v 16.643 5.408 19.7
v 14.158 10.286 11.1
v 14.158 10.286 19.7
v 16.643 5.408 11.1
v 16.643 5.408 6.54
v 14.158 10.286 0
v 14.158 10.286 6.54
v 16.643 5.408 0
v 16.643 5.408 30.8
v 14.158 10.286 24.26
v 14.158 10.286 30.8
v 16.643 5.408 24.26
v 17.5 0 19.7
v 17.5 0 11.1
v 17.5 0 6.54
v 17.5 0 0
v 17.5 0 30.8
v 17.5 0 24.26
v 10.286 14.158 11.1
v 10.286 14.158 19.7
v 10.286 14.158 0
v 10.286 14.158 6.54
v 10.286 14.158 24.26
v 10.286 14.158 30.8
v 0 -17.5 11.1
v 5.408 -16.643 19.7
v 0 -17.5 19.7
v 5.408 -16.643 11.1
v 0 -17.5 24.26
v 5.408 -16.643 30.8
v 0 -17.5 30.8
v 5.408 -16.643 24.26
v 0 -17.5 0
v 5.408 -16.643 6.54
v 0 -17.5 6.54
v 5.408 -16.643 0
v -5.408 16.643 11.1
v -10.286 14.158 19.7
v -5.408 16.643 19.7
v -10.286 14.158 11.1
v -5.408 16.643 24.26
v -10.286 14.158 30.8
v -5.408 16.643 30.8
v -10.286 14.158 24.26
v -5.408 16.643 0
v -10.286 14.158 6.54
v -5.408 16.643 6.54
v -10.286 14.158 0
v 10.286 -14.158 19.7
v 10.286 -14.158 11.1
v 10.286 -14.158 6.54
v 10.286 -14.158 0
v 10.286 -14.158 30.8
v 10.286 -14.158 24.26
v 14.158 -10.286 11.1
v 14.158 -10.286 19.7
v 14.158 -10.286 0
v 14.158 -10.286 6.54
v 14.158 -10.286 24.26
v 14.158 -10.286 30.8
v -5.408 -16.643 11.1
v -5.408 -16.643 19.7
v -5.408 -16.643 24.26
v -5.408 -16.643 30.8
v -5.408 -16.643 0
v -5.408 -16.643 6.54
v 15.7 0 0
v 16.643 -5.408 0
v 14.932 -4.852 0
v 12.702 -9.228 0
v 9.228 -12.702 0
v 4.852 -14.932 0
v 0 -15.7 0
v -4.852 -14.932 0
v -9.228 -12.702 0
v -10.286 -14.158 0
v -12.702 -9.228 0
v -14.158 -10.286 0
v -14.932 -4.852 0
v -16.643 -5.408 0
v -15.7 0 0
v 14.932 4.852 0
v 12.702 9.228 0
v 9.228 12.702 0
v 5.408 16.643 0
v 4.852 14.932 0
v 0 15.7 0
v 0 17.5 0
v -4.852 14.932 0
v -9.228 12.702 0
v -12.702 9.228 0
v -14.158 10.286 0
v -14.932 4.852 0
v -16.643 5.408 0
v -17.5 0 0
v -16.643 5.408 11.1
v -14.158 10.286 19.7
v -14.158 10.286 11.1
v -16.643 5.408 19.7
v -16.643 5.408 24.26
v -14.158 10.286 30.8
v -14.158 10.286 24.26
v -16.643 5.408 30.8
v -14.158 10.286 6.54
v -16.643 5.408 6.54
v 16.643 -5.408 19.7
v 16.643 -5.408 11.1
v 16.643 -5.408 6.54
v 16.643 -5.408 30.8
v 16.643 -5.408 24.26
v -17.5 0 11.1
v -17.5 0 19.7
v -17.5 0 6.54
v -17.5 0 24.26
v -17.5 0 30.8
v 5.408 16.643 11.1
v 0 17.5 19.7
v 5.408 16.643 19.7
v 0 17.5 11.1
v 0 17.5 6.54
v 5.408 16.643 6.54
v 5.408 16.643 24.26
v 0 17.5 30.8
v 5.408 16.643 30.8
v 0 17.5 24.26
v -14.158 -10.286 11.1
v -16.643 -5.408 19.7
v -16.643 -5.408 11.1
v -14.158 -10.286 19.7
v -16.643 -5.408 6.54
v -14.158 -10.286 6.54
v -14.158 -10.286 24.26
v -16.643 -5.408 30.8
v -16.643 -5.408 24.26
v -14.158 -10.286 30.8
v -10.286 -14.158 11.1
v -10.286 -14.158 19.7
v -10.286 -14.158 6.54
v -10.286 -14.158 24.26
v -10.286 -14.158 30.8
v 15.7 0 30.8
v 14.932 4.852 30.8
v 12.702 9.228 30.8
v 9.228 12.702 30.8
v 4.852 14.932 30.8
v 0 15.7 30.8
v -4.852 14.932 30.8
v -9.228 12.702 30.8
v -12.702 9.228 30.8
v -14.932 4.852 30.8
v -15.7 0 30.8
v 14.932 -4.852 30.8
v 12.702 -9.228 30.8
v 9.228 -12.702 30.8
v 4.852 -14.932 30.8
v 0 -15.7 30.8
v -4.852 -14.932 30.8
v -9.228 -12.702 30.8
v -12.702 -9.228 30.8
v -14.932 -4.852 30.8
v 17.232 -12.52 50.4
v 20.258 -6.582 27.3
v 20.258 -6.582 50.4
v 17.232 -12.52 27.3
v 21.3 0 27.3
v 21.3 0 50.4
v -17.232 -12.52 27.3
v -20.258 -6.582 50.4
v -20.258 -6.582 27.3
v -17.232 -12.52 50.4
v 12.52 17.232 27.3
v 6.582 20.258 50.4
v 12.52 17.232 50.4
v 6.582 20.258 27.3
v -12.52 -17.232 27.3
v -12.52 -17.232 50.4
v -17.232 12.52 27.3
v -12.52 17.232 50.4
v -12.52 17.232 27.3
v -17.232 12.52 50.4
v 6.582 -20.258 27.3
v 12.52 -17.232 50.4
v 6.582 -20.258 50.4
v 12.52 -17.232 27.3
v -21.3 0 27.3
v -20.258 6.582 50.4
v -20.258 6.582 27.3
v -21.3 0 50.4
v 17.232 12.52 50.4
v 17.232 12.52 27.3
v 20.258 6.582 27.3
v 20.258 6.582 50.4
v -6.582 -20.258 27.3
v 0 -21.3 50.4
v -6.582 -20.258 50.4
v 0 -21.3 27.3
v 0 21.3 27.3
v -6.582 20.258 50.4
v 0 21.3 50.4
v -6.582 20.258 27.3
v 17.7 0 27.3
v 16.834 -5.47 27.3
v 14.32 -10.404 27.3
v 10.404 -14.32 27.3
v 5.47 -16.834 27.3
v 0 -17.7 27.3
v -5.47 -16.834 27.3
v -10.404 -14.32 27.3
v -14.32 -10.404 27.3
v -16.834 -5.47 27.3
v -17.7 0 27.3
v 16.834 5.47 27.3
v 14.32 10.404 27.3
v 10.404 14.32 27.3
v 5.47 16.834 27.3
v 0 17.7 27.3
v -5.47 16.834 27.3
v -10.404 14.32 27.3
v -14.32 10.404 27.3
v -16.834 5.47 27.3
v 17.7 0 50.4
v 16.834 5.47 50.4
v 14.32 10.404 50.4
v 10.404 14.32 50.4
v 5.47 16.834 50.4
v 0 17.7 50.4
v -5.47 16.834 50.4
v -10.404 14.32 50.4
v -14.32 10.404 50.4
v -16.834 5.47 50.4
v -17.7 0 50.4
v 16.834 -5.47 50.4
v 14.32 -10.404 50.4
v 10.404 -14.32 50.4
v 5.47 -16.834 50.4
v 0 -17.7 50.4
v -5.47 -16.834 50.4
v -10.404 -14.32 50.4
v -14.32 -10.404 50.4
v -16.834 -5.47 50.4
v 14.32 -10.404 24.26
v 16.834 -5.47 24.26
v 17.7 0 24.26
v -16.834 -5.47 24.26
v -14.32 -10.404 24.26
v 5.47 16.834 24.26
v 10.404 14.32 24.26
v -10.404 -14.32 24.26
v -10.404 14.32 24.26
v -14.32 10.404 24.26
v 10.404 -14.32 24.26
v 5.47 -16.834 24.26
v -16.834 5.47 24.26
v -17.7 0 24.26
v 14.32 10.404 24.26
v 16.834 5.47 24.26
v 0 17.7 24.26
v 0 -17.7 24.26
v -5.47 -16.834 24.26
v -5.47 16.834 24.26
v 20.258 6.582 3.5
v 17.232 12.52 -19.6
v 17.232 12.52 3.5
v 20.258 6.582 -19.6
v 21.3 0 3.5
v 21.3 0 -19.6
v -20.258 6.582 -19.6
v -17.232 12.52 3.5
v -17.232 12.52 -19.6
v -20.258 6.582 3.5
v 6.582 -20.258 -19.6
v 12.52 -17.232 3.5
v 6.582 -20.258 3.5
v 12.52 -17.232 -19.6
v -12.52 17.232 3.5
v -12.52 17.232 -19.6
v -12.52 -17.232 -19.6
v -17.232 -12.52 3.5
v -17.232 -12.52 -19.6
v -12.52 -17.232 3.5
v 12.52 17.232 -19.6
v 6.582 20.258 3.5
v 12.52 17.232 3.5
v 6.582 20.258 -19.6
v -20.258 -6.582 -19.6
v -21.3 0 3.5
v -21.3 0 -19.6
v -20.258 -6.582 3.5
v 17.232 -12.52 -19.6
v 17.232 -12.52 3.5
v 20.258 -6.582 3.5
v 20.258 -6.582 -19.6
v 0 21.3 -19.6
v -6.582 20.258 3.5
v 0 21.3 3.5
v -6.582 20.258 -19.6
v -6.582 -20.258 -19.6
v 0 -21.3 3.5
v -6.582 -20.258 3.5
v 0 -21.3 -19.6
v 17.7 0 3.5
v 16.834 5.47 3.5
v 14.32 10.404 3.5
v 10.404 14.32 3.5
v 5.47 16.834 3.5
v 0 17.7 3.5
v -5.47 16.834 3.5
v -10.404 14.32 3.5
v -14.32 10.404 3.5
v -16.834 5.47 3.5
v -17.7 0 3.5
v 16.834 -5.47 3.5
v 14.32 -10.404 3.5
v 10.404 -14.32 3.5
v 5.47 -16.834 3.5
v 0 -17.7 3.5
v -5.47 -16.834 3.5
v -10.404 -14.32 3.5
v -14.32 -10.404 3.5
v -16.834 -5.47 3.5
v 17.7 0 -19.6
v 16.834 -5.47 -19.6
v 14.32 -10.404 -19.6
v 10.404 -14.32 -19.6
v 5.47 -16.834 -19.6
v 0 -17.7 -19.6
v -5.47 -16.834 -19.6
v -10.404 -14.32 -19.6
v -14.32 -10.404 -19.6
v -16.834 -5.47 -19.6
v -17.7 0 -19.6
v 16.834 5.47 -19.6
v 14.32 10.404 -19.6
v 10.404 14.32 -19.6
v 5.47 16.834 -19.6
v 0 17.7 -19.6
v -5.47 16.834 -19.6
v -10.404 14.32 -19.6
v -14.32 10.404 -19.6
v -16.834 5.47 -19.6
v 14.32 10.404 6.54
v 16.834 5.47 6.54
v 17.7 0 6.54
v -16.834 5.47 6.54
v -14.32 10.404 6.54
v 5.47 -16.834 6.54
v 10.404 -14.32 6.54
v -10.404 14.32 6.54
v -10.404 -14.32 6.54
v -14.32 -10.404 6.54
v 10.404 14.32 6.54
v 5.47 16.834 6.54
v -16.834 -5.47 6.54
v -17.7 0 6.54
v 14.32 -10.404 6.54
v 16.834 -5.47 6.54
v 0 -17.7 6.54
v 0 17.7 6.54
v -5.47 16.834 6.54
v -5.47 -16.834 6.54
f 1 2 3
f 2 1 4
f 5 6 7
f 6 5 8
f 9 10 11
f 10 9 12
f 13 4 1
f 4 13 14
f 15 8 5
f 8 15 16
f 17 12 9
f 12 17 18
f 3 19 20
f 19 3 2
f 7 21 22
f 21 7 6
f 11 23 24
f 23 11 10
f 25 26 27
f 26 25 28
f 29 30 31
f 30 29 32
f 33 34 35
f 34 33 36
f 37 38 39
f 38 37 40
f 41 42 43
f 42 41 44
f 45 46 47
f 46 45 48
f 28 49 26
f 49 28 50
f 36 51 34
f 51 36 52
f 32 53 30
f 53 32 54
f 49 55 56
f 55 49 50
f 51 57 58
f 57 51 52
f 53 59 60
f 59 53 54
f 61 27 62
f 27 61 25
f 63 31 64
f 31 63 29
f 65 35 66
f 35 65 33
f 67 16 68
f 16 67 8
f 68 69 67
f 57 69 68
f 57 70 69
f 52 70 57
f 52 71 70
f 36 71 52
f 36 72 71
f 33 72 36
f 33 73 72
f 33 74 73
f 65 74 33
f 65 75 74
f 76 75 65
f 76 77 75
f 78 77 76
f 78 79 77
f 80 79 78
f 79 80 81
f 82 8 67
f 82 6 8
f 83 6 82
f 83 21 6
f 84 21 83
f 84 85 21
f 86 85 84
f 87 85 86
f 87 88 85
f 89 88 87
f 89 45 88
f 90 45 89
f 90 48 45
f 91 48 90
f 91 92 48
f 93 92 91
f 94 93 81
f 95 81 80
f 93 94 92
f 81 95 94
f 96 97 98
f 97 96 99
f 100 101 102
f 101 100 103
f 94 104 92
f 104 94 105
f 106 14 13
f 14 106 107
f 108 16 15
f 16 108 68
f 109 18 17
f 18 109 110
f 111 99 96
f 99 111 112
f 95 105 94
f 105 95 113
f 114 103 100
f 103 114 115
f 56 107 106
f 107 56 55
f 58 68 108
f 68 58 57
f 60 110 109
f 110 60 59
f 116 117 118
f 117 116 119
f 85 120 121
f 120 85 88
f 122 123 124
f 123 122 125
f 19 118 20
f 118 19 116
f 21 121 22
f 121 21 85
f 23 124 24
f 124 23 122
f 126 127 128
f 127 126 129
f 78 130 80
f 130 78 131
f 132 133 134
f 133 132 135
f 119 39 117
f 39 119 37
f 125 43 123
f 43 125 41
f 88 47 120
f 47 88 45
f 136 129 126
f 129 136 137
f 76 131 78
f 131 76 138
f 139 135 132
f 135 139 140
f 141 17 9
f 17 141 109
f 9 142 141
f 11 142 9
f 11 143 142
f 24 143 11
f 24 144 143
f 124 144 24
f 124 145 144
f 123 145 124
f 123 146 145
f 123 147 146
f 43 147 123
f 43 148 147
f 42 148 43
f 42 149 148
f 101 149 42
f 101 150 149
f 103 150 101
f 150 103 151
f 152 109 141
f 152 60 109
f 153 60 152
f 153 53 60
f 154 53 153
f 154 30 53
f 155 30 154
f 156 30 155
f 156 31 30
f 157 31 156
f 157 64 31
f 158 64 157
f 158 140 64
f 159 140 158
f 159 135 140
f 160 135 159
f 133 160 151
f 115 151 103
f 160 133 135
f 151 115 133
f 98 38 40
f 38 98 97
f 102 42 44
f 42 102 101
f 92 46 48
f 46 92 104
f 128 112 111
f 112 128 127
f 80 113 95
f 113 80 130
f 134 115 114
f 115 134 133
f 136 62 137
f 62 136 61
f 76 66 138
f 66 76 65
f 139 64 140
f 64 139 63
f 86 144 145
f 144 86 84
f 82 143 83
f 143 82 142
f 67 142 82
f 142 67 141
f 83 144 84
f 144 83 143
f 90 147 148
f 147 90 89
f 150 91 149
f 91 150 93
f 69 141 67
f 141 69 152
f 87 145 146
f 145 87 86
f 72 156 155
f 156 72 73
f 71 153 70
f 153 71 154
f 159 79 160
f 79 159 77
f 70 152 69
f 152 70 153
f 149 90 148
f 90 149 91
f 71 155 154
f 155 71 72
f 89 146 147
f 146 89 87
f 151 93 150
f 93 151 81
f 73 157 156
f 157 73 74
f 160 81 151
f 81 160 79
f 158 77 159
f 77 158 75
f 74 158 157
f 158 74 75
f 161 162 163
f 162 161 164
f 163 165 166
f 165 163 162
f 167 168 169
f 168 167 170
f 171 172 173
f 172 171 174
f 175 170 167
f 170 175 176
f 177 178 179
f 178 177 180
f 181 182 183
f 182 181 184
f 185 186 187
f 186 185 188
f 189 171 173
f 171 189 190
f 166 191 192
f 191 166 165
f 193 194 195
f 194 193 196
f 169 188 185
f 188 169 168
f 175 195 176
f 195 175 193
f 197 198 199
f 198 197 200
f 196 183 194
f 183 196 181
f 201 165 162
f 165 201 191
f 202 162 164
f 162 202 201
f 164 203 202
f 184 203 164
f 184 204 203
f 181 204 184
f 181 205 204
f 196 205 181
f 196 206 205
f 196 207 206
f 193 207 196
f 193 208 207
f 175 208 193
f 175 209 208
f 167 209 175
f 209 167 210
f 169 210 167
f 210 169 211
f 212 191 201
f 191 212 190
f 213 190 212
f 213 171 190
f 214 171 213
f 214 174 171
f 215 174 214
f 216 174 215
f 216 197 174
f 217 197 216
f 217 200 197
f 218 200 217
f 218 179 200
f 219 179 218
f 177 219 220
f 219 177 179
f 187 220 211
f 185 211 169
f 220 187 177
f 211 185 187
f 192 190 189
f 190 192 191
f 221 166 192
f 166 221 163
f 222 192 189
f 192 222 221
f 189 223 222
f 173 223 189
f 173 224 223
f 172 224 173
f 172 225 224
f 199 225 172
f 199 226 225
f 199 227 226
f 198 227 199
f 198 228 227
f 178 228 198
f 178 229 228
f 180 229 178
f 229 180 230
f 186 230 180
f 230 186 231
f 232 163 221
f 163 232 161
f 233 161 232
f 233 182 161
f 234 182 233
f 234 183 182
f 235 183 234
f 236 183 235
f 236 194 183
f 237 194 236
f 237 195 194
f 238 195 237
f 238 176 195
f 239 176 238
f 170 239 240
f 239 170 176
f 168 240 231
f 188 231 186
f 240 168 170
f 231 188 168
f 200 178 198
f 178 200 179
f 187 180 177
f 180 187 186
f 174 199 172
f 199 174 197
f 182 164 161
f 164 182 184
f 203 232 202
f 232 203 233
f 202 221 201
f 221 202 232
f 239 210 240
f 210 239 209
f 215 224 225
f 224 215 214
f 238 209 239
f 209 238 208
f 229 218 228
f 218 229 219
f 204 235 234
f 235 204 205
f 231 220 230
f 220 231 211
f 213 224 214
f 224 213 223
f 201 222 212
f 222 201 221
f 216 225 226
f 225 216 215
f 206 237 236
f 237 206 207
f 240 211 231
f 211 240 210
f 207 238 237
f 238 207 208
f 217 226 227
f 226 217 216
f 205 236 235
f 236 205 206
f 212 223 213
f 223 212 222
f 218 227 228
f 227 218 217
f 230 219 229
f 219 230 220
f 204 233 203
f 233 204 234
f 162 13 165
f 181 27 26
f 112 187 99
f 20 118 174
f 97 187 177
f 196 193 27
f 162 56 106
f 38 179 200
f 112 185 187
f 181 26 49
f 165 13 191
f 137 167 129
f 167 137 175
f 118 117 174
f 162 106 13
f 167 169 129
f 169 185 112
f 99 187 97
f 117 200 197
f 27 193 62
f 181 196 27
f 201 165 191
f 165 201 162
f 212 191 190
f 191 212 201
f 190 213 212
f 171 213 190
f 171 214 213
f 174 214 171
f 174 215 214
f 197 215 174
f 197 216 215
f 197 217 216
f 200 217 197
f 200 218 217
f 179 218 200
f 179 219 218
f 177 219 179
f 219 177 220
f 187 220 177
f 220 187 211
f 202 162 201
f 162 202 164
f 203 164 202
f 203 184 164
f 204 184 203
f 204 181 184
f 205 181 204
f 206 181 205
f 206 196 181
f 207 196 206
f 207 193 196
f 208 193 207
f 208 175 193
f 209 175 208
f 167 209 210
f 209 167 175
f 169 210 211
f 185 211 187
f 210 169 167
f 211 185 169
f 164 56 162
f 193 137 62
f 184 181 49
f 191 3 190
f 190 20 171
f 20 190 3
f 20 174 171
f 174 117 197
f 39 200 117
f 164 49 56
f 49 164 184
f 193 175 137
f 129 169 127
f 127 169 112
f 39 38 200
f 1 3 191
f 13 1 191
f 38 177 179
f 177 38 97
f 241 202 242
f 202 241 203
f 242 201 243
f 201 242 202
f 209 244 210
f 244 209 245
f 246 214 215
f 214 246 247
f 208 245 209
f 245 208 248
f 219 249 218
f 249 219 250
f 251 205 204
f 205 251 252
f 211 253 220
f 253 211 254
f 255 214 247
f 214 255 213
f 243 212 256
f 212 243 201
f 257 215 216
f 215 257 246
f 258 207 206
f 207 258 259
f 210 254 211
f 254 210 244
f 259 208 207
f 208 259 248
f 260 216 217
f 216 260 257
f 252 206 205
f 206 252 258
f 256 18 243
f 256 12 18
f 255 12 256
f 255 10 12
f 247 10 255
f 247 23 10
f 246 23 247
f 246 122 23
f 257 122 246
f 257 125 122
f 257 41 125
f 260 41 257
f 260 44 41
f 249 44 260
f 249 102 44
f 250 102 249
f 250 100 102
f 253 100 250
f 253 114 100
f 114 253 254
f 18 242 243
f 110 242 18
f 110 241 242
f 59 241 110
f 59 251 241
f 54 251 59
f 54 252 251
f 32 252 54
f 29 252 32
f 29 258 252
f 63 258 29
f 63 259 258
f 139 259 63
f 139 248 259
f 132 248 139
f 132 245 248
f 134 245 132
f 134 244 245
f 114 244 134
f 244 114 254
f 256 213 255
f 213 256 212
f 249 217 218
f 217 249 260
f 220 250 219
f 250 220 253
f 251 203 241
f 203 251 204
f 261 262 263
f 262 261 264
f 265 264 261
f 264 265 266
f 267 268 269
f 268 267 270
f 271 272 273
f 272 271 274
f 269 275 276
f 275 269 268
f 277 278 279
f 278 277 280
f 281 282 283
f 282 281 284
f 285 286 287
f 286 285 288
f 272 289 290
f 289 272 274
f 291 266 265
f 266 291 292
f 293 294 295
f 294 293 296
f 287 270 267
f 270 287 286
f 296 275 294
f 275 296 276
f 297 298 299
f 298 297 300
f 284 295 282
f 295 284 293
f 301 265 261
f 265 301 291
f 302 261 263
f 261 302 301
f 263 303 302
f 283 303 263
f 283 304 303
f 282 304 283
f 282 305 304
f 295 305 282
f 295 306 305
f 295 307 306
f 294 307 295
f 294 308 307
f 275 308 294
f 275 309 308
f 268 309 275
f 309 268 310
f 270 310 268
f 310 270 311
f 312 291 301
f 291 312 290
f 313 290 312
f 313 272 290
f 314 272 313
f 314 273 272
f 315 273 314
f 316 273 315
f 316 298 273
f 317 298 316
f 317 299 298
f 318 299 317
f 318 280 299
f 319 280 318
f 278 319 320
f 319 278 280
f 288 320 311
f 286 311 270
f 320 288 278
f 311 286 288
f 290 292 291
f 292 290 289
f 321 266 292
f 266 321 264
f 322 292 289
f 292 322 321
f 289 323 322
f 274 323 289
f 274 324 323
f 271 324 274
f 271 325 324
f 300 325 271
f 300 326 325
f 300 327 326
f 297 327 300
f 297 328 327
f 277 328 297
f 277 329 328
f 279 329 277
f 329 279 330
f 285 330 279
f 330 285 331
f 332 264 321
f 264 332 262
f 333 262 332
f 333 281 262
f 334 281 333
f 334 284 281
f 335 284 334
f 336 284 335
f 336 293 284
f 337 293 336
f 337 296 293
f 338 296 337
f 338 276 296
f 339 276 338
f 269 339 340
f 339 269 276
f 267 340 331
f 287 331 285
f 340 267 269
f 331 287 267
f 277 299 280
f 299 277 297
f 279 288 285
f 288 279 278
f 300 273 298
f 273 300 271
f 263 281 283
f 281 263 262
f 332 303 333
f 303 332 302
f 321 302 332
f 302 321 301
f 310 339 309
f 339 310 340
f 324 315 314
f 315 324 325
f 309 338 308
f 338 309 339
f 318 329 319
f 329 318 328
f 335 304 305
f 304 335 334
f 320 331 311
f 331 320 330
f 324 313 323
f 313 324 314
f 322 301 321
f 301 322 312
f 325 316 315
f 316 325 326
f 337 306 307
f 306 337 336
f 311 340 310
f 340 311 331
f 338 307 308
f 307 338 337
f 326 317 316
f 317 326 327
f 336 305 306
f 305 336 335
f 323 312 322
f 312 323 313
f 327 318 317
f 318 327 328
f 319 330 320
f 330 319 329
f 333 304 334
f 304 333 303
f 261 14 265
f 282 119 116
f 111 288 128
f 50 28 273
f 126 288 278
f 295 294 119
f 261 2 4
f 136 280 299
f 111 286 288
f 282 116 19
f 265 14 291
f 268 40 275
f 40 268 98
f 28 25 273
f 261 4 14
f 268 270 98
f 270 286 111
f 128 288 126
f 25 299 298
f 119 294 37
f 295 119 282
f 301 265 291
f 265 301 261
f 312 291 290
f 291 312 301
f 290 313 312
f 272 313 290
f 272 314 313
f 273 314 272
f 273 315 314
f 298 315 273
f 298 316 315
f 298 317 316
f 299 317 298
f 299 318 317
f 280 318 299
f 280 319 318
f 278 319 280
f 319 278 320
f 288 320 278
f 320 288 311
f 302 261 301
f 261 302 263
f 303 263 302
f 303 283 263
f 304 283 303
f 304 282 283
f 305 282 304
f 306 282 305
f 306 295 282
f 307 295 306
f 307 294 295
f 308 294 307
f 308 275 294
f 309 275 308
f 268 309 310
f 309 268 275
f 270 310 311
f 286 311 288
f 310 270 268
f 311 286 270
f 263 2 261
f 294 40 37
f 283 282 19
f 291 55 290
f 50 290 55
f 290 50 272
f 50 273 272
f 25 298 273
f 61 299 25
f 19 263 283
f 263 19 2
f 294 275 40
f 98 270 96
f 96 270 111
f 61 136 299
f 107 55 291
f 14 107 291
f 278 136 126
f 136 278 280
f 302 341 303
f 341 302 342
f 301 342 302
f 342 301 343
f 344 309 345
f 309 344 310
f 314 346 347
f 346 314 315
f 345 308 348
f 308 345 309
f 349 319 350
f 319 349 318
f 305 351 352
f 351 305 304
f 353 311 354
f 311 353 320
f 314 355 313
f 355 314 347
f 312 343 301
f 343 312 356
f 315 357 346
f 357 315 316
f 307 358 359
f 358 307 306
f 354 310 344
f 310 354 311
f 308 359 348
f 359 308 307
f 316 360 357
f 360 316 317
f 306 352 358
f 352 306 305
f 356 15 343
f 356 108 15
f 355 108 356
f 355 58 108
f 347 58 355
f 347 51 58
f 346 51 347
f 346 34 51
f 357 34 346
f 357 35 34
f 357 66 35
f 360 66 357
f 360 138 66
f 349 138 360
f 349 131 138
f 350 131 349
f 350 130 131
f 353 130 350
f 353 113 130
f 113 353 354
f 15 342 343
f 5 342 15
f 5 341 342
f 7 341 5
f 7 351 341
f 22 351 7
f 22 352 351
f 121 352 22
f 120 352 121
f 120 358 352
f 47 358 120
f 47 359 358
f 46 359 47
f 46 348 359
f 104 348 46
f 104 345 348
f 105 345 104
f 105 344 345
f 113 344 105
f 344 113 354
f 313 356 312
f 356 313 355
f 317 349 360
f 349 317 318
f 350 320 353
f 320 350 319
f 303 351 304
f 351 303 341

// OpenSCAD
/*Round Duct/Pipework fittings Library - Parametric
By the DoomMeister

//Released under the terms of the GNU GPL v3.0
This program is free software: you can redistribute it and/or modify
it under the terms of the GNU General Public License as published by
the Free Software Foundation, either version 3 of the License, or
(at your option) any later version.

This program is distributed in the hope that it will be useful,
but WITHOUT ANY WARRANTY; without even the implied warranty of
MERCHANTABILITY or FITNESS FOR A PARTICULAR PURPOSE. See the
GNU General Public License for more details.

You should have received a copy of the GNU General Public License
along with this program. If not, see <http://www.gnu.org/licenses/>.

**
WARNING - No warrenty is given regarding the fitness of these parts to convey pressurised 
media if they are fabricated by any means. The user takes all risk in terms of saftey and material choice. 
**

Shapes

Straight
Elbow/Tee (any angle, n ways)
Nozel
Reducer
Manifold

Solvent
Clamp
O-Ring Push Fit

*/

duct_OD = 35;//15,22,28,35,42,54,65,80,100,150
duct_OD2 = 28;
duct_wall = 1.8;
duct_length = 40;
quality = 20;
clearance = 0.2;
o_ring_section = 3;
bolt_OD = round(duct_OD/8);
reduction_angle = 30;
end_type = "solvent"; //solvent, clamp, none


duct_OR = duct_OD/2;
duct_OR2 = duct_OD2/2;
duct_IR = (duct_OD-(2*duct_wall))/2;
duct_IR2 = (duct_OD2-(2*duct_wall))/2;
reduction_length = (duct_OR - duct_OR2)/sin(reduction_angle);
clamp_IR = duct_OR + clearance;
clamp_OR = clamp_IR + (2*duct_wall);
clamp_reduction_length = (clamp_OR - duct_OR)/sin(reduction_angle);




//draw

//translate([0,0,0])middle_straight();
//translate([1*1.5*duct_OD,0*1.5*duct_OD,0])pipe();
connector(end=end_type);
//translate([2*1.5*duct_OD,0*1.5*duct_OD,0])
//elbow(end=end_type);
//translate([2*1.5*duct_OD,2*1.5*duct_OD,0])equal_tee(end=end_type);
//translate([2*1.5*duct_OD,3*1.5*duct_OD,0])4_way_tee(end=end_type);
//translate([0*1.5*duct_OD,3*1.5*duct_OD,0])middle_reducer(end=end_type);
//translate([0*1.5*duct_OD,1.5*1.5*duct_OD,0])straight(end=end_type);
//translate([0*1.5*duct_OD,4*1.5*duct_OD,0])blank_cap(end=end_type);
/*
middle_tee_n(ways = 3, end=end_type, angle = 120 ,center = true, $fn=quality);
middle_tee_n(ways = 2, end=end_type, angle = 135 ,center = true, $fn=quality);
*/

//translate([0*1.5*duct_OD,5*1.5*duct_OD,0])manifold_n(ways = 6, end=end_type,center = true, $fn=quality);

//alaises
module elbow(end="solvent", angle = 90,center = true, $fn=quality)
{
	middle_tee_n(end=end,ways=2, angle = angle); 	
}

module equal_tee(end="solvent",angle = 90,center = true, $fn=quality)
{
	middle_tee_n(end=end,ways=3, angle = 90); 	
}

module 4_way_tee(end="solvent",angle = 90,center = true, $fn=quality)
{
	middle_tee_n(end=end,ways=4, angle = 90); 	
}


//modules

module pipe(length=duct_length)
{
	middle_straight(length=length);
}


module straight(end = "solvent",length=duct_length)
{

offset1 =(3*bolt_OD) + clamp_reduction_length;

	union()
	{



	middle_straight(length=length-(offset1));
	translate([0,0,length])rotate([180,0,0])end(end_form=end);
	}
}

module blank_cap(end = "solvent",length=duct_length,$fn=quality)
{

offset1 =(3*bolt_OD) + clamp_reduction_length;

	union()
	{


	translate([0,0,-duct_wall])cylinder(r=duct_OR, h = duct_wall);
	middle_straight(length=length-(offset1));
	translate([0,0,length])rotate([180,0,0])end(end_form=end);
	}
}


module end(end_form = "solvent")
{
if(end_form == "clamp")
{
	end_clamp();
}
if(end_form == "solvent")
{
	end_solvent();
}
}

module connector(end="solvent", length=2*duct_OD)
{
offset_length = 3*bolt_OD+clamp_reduction_length;

union()
{
	middle_straight(length=length-(2*offset_length));
	translate([0,0,length-offset_length])rotate([180,0,0])end(end_form=end);
	translate([0,0,-offset_length])rotate([0,0,0])end(end_form=end);
}
}




//middle_modules

module middle_straight(length = 40, center = true, $fn=quality)
{
	difference()
	{
		cylinder(r = duct_OR, h = length);
		translate([0,0,-1])cylinder(r = duct_IR, h = length+2);
	}
}




module middle_tee_n(ways = 1, end="solvent", angle = 130 ,center = true, $fn=quality)
{
	difference()
	{
		union()
		{
			sphere(r=duct_OD/2);
			for( i = [0:ways-1])
			{
				rotate([0,i*angle,0])straight(end=end,length=duct_OD*1.5);//cylinder(r = duct_OR, h = duct_length);
			}
		}
		union()
		{
			sphere(r=duct_IR);
			for( i = [0:ways-1])
			{
				rotate([0,i*angle,0])cylinder(r = duct_IR, h = duct_length+1);
			}
		}
	}

}

module manifold_n(ways = 3, end="solvent", offset=1.5,center = true, $fn=quality)
{
	
	difference()
	{
		union()
		{
			//sphere(r=duct_OD/2);
			rotate([0,270,0])straight(end=end,length=duct_OD*1.5);
			rotate([0,90,0])cylinder(r=duct_OR, h = ways*duct_OD*offset);
			for( i = [0:ways-1])
			{
				translate([i*duct_OD*offset,0,0,])rotate([0,180,90])straight(end=end,length=duct_OD*1.5);
			}
		}
		union()
		{
			#sphere(r=duct_IR);
			translate([-1,0,0,])rotate([0,90,0])cylinder(r=duct_IR, h = ways*duct_OD*offset+2);
			for( i = [0:ways-1])
			{
				translate([i*duct_OD*offset,0,0,])rotate([0,180,90])cylinder(r = duct_IR, h = duct_length+1);
			}
		}
	}

}

module middle_reducer(end="solvent",center = true, $fn=quality)
{
	length1 = (duct_length - reduction_length)/2;
	offset_length = 3*bolt_OD+clamp_reduction_length;
	union()
	{
		difference()
		{
			cylinder(r = duct_OR, h = length1);
			translate([0,0,-1])cylinder(r = duct_IR, h = length1+1);
		}
		translate([0,0,length1])
		difference()
		{
			cylinder(r1 = duct_OR,r2 = duct_OR2, h = reduction_length);
			translate([0,0,0])cylinder(r1 = duct_IR,r2 = duct_IR2, h = reduction_length);
		}
		translate([0,0,length1+reduction_length])
		difference()
		{
			cylinder(r = duct_OR2, h = length1);
			translate([0,0,-1])cylinder(r = duct_IR2, h = length1+2);
		}
	
		translate([0,0,-offset_length])rotate([0,0,0])end(end_form=end);

	}


}


module middle_nozel()
{

}

module end_clamp(center = true, $fn=quality)
{
	union()
	{
	difference()
	{
		union()
		{
			cylinder(r = clamp_OR, h = bolt_OD*3);
			translate([clamp_OR-bolt_OD*3,-bolt_OD*2.5,0])cube([bolt_OD*4,bolt_OD*5,bolt_OD*3]);
			translate([clamp_OR+bolt_OD,bolt_OD*1.5,0])rotate([0,0,0])cylinder(r=bolt_OD, h = bolt_OD*3);
			translate([clamp_OR+bolt_OD,-bolt_OD*1.5,0])rotate([0,0,0])cylinder(r=bolt_OD, h = bolt_OD*3);
		}
		#translate([0,0,-1])cylinder(r = clamp_IR, h = (bolt_OD*3)+2);
		translate([clamp_OR-bolt_OD*2,-bolt_OD*0.5,0])cube([bolt_OD*5,bolt_OD,bolt_OD*3]);
		translate([clamp_OR+(bolt_OD*0.75),bolt_OD*3,bolt_OD*1.5])rotate([90,0,0])cylinder(r=bolt_OD/2, h = bolt_OD*6);
		translate([clamp_IR-bolt_OD,0,bolt_OD*3])rotate([0,90,0])cylinder(r=bolt_OD, h = bolt_OD*6);
		translate([clamp_OR-bolt_OD,0,0])rotate([0,0,0])cylinder(r=bolt_OD, h = bolt_OD*3);

	}
		translate([0,0,bolt_OD*3])
		difference()
		{
			cylinder(r1 = clamp_OR,r2 = duct_OR, h = clamp_reduction_length);
			cylinder(r = clamp_IR, h = clamp_reduction_length*0.4);
			translate([0,0,0])cylinder(r1 = clamp_IR,r2 = duct_IR, h = clamp_reduction_length);
			//#translate([clamp_IR-bolt_OD,0,0])rotate([0,90,0])cylinder(r=bolt_OD, h = bolt_OD*6);
		}
	}

}

module end_solvent(center = true, $fn=quality)
{
	union()
	{
	difference()
	{
		union()
		{
			cylinder(r = clamp_OR, h = duct_OD*0.66);
		}
		translate([0,0,-1])cylinder(r = clamp_IR, h = (duct_OD*0.66)+2);
	}
		translate([0,0,duct_OD*0.66])
		difference()
		{
			cylinder(r1 = clamp_OR,r2 = duct_OR, h = clamp_reduction_length);
			cylinder(r = clamp_IR, h = clamp_reduction_length*0.4);
			translate([0,0,0])cylinder(r1 = clamp_IR,r2 = duct_IR, h = clamp_reduction_length);
			}
	}

}

echo(reduction_length,bolt_OD);
